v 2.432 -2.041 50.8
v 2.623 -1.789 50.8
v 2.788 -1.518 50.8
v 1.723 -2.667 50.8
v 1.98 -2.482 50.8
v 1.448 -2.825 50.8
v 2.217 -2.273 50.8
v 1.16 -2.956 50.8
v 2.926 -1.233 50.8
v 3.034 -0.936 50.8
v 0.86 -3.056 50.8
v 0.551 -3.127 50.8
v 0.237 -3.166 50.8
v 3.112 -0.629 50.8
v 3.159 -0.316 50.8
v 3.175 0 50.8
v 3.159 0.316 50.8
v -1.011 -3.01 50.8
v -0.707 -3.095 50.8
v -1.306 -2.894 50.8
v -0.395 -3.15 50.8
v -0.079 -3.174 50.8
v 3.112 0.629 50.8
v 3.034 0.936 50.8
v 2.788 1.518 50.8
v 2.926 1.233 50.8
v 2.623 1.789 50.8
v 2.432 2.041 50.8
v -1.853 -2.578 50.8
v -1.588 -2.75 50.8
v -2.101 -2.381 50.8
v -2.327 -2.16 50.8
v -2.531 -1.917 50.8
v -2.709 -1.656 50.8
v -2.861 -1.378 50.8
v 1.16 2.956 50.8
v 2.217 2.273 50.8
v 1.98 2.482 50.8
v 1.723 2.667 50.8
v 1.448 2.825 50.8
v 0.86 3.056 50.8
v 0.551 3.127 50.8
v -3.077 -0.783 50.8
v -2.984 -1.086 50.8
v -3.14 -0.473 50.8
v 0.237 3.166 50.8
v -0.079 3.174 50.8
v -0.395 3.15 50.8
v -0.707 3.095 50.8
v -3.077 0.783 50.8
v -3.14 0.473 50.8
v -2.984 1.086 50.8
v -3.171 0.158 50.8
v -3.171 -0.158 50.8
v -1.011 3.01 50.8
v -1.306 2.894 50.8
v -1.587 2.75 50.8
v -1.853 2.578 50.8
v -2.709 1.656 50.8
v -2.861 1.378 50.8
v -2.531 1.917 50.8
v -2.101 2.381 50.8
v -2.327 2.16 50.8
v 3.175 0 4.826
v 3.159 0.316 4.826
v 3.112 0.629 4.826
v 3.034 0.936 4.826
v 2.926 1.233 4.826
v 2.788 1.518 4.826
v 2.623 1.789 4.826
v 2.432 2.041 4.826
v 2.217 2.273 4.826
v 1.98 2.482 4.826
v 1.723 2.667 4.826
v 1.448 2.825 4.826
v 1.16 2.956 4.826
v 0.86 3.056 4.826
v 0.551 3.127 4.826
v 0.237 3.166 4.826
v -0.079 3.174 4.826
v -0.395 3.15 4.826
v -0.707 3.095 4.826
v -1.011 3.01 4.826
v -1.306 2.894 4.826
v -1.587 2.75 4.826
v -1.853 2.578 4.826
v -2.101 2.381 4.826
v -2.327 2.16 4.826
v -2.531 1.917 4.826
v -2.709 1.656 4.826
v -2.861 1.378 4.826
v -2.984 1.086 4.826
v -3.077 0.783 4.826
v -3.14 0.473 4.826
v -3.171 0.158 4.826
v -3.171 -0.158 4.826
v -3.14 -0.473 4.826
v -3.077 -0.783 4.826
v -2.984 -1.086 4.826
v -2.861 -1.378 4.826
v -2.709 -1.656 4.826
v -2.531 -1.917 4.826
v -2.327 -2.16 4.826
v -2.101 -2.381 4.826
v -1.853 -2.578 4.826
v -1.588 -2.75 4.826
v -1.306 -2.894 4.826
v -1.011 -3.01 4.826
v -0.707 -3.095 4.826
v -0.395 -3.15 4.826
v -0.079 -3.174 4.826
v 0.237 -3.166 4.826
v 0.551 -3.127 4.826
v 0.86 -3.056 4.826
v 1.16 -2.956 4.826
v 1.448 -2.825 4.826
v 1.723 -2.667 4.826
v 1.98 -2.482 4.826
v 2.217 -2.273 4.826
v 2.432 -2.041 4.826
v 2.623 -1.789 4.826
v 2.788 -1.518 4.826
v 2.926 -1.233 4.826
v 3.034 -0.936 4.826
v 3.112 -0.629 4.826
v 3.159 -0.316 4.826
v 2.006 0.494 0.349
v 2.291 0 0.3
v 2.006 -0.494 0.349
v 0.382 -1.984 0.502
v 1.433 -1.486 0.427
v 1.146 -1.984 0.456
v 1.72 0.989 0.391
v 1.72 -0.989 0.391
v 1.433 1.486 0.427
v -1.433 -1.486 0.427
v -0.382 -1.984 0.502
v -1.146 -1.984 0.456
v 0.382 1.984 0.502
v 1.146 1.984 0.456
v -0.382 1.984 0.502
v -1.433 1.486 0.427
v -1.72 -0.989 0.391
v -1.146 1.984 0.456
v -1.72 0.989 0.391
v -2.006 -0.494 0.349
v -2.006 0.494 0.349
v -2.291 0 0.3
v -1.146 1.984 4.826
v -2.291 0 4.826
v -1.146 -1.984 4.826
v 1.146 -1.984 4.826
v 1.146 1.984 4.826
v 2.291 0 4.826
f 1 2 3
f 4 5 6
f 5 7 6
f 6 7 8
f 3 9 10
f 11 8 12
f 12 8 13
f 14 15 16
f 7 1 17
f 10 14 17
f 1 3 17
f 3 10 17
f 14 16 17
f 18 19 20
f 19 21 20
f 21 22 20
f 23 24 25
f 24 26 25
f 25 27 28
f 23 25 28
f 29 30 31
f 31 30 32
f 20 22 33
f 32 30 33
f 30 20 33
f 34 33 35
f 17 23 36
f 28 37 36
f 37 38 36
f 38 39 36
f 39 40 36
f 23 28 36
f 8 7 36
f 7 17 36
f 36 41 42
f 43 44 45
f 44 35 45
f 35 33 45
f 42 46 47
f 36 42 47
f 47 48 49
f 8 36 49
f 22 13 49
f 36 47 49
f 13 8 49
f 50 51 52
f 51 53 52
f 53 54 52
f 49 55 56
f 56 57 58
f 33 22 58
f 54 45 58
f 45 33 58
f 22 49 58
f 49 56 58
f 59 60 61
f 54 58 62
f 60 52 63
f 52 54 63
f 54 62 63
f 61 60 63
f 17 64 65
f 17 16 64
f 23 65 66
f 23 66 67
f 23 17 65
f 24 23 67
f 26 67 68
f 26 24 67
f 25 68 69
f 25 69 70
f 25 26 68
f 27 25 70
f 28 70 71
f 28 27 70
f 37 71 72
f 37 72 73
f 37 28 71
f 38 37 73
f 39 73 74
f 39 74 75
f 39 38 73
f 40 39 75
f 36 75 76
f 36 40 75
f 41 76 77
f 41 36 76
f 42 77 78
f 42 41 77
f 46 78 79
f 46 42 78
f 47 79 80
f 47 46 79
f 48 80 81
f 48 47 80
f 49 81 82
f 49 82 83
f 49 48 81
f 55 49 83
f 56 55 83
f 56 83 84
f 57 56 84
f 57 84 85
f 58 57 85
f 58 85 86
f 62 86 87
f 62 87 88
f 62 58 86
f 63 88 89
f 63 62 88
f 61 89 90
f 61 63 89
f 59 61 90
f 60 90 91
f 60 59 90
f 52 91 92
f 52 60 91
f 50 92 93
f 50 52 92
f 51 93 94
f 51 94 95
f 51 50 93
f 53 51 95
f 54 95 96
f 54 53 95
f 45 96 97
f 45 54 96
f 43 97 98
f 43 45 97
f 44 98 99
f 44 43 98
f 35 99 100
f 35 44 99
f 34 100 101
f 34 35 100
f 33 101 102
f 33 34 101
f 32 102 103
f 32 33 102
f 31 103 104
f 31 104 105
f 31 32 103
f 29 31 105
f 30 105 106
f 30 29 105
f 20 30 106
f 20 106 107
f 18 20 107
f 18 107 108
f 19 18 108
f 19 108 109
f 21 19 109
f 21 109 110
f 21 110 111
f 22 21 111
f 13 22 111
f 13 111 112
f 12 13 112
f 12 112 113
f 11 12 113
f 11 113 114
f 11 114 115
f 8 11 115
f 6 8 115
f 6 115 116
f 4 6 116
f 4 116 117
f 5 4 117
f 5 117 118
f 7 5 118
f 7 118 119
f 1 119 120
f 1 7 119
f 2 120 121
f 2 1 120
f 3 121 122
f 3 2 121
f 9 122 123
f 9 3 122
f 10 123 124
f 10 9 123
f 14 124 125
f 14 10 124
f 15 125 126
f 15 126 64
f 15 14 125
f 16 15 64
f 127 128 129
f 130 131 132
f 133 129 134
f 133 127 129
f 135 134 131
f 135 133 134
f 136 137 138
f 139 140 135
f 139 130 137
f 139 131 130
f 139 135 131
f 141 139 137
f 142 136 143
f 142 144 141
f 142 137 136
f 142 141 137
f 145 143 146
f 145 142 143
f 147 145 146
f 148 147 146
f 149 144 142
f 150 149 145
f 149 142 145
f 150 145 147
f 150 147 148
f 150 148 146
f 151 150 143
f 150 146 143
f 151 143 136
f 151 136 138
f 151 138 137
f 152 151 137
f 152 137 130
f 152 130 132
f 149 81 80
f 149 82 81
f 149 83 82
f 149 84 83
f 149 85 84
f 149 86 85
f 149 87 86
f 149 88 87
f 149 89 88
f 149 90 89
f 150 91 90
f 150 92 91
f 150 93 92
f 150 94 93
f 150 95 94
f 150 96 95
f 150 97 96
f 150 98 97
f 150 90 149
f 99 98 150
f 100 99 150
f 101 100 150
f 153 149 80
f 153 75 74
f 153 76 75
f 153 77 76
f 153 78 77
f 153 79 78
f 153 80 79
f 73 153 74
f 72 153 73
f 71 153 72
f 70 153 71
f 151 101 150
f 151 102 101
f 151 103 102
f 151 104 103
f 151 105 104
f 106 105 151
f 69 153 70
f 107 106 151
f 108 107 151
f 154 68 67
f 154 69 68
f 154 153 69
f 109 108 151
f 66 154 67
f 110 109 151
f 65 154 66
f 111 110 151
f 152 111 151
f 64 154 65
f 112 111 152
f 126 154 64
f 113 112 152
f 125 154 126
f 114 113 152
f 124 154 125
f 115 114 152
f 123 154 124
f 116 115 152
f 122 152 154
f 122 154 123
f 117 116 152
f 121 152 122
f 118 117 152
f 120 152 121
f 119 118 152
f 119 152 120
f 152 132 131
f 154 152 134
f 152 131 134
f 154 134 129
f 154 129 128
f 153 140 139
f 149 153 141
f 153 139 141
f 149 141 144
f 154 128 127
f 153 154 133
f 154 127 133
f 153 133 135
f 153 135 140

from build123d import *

# Parameters (mm, degrees)
F0_W          = 3.175
F0_H          = 50.8
F2_R          = 4.7625
F3_DEPTH      = 4.826
F4_R          = 12.7
F5_DEPTH      = 3.176
F5_DEPTH_BACK = 3.176


with BuildPart() as f1:
    # F0 (on Front) → F1 (revolve)
    with BuildSketch(Plane.XZ):
        with Locations((1.5875, 25.4)):
            Rectangle(F0_W, F0_H)
    revolve(axis=Axis((0, 0, 31.9059565663), (0, 0, 1)))

    # F2 (on face) → F3 (cut)
    with BuildSketch(Plane(origin=(0, 0, 0), x_dir=(1, 0, 0), z_dir=(0, 0, -1))):
        Circle(F2_R)
        Polygon((-2.2913588808, 0), (-1.1456794404, 1.984375), (1.1456794404, 1.984375), (2.2913588808, 0), (1.1456794404, -1.984375), (-1.1456794404, -1.984375), align=None, mode=Mode.SUBTRACT)
    extrude(amount=-F3_DEPTH, mode=Mode.SUBTRACT)

    # F4 (on Front) → F5 (cut, two sides)
    with BuildSketch(Plane.XZ) as f5_sk:
        with Locations((0, -12.192)):
            Circle(F4_R)
    extrude(amount=-F5_DEPTH, mode=Mode.SUBTRACT)
    extrude(f5_sk.sketch, amount=F5_DEPTH_BACK, mode=Mode.SUBTRACT)


solid = f1.part
